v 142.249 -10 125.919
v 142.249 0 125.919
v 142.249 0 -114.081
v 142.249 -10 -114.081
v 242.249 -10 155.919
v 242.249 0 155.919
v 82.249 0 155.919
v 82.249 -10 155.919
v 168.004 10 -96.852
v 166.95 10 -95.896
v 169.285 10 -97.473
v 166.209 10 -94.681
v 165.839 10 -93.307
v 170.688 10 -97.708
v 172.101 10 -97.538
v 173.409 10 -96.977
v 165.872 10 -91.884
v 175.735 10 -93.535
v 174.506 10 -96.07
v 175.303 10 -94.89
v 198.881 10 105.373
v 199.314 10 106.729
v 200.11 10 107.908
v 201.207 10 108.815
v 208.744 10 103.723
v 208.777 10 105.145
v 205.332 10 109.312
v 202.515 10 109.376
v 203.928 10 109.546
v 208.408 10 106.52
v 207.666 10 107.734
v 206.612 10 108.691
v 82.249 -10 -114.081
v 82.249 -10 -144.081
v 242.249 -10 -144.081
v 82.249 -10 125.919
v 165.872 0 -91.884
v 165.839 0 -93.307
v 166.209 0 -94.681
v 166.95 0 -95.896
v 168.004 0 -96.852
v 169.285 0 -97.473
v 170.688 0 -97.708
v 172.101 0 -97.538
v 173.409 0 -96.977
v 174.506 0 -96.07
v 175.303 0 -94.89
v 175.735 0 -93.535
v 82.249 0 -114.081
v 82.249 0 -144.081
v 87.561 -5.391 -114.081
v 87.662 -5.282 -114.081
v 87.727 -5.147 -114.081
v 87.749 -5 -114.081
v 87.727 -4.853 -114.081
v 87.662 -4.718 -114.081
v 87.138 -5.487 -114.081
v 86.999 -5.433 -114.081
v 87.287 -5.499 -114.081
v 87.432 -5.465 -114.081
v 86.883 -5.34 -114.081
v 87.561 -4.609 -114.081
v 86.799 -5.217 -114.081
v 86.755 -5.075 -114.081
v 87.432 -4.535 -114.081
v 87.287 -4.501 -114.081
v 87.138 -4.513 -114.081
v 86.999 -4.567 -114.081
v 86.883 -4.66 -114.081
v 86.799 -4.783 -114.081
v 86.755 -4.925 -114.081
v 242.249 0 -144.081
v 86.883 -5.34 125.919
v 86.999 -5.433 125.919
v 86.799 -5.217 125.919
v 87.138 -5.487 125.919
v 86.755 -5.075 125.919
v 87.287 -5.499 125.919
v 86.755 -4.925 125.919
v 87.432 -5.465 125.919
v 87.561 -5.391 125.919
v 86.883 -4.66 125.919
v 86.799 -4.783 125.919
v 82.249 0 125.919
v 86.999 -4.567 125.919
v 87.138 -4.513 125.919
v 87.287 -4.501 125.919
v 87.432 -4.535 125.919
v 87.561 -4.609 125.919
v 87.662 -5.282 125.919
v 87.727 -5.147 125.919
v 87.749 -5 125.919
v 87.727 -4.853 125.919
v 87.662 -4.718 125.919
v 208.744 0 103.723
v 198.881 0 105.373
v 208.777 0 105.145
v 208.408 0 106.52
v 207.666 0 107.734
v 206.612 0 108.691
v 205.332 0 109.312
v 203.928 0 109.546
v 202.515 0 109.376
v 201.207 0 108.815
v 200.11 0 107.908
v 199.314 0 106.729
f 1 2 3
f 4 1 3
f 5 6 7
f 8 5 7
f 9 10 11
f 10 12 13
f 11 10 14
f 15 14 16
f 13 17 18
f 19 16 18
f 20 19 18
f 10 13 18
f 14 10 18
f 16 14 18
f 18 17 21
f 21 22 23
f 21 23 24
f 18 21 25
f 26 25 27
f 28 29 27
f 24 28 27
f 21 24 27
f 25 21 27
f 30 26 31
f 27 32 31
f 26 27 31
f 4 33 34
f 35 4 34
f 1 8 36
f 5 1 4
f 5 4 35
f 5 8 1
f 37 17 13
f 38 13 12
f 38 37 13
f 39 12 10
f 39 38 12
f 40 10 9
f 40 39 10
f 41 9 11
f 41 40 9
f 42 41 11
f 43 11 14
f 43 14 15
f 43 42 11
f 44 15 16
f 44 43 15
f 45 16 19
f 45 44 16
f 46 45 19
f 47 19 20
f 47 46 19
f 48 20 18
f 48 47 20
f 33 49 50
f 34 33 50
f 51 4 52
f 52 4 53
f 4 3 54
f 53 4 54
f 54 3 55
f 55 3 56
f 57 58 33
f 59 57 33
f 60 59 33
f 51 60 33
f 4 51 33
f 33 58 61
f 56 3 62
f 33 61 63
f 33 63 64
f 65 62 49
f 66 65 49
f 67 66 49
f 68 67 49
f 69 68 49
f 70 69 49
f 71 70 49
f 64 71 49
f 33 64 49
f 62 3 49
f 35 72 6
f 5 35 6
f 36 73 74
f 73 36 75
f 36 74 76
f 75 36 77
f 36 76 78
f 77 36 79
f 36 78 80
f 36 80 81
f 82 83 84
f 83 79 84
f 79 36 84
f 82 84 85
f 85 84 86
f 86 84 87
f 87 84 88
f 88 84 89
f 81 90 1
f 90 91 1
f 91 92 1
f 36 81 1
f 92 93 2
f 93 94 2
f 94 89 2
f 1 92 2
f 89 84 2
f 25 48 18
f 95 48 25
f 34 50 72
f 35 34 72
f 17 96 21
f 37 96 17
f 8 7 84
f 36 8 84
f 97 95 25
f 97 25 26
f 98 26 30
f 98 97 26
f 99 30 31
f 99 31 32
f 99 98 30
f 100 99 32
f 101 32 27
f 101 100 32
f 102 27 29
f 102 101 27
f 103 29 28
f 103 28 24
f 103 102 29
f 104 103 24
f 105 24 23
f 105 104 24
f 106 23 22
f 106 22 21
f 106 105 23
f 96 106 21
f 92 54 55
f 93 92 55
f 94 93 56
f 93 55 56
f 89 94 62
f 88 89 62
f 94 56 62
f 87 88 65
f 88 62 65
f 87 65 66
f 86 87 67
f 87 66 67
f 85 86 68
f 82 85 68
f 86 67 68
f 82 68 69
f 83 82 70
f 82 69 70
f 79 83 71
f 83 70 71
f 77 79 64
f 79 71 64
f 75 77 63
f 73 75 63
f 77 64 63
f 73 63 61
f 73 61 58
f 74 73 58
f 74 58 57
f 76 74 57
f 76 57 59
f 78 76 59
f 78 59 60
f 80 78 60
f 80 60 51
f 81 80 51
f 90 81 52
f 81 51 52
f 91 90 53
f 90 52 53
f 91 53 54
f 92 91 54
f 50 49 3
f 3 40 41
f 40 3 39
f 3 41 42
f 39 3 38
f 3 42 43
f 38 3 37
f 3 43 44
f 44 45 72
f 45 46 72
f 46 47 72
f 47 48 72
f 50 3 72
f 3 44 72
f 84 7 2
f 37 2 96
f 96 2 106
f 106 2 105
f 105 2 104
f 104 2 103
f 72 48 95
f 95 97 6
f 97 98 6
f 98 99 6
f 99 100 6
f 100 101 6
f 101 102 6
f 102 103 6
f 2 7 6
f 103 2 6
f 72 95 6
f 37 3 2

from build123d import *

# Parameters (mm, degrees)
F1_DEPTH = 10
F2_R     = 0.5
F3_DEPTH = 240
F5_DEPTH = 20


with BuildPart() as f1:
    # F0 (on Front) → F1 (new body)
    with BuildSketch(Plane.XZ):
        Polygon((82.249313, 125.919251), (142.249313, 125.919251), (142.249313, -114.080749), (82.249313, -114.080749), (82.249313, -144.080749), (142.249313, -144.080749), (242.249313, -144.080749), (242.249313, 155.919251), (142.249313, 155.919251), (82.249313, 155.919251), align=None)
    extrude(amount=F1_DEPTH)

    # F2 (on face) → F3 (join, through all)
    with BuildSketch(Plane.XY.offset(-114.080749)):
        with Locations((87.249313, -5)):
            Circle(F2_R)
    extrude(amount=F3_DEPTH)

    # F4 (on face) → F5 (join)
    with BuildSketch(Plane.XZ.offset(10)):
        with BuildLine():
            ThreePointArc((208.744351, 103.722573), (204.638161, 109.479239), (198.881495, 105.373049))
            Line((198.881495, 105.373049), (165.871974, -91.884072))
            ThreePointArc((165.871974, -91.884072), (169.978164, -97.640738), (175.73483, -93.534548))
            Line((175.73483, -93.534548), (208.744351, 103.722573))
        make_face()
    extrude(amount=-F5_DEPTH)


solid = f1.part
